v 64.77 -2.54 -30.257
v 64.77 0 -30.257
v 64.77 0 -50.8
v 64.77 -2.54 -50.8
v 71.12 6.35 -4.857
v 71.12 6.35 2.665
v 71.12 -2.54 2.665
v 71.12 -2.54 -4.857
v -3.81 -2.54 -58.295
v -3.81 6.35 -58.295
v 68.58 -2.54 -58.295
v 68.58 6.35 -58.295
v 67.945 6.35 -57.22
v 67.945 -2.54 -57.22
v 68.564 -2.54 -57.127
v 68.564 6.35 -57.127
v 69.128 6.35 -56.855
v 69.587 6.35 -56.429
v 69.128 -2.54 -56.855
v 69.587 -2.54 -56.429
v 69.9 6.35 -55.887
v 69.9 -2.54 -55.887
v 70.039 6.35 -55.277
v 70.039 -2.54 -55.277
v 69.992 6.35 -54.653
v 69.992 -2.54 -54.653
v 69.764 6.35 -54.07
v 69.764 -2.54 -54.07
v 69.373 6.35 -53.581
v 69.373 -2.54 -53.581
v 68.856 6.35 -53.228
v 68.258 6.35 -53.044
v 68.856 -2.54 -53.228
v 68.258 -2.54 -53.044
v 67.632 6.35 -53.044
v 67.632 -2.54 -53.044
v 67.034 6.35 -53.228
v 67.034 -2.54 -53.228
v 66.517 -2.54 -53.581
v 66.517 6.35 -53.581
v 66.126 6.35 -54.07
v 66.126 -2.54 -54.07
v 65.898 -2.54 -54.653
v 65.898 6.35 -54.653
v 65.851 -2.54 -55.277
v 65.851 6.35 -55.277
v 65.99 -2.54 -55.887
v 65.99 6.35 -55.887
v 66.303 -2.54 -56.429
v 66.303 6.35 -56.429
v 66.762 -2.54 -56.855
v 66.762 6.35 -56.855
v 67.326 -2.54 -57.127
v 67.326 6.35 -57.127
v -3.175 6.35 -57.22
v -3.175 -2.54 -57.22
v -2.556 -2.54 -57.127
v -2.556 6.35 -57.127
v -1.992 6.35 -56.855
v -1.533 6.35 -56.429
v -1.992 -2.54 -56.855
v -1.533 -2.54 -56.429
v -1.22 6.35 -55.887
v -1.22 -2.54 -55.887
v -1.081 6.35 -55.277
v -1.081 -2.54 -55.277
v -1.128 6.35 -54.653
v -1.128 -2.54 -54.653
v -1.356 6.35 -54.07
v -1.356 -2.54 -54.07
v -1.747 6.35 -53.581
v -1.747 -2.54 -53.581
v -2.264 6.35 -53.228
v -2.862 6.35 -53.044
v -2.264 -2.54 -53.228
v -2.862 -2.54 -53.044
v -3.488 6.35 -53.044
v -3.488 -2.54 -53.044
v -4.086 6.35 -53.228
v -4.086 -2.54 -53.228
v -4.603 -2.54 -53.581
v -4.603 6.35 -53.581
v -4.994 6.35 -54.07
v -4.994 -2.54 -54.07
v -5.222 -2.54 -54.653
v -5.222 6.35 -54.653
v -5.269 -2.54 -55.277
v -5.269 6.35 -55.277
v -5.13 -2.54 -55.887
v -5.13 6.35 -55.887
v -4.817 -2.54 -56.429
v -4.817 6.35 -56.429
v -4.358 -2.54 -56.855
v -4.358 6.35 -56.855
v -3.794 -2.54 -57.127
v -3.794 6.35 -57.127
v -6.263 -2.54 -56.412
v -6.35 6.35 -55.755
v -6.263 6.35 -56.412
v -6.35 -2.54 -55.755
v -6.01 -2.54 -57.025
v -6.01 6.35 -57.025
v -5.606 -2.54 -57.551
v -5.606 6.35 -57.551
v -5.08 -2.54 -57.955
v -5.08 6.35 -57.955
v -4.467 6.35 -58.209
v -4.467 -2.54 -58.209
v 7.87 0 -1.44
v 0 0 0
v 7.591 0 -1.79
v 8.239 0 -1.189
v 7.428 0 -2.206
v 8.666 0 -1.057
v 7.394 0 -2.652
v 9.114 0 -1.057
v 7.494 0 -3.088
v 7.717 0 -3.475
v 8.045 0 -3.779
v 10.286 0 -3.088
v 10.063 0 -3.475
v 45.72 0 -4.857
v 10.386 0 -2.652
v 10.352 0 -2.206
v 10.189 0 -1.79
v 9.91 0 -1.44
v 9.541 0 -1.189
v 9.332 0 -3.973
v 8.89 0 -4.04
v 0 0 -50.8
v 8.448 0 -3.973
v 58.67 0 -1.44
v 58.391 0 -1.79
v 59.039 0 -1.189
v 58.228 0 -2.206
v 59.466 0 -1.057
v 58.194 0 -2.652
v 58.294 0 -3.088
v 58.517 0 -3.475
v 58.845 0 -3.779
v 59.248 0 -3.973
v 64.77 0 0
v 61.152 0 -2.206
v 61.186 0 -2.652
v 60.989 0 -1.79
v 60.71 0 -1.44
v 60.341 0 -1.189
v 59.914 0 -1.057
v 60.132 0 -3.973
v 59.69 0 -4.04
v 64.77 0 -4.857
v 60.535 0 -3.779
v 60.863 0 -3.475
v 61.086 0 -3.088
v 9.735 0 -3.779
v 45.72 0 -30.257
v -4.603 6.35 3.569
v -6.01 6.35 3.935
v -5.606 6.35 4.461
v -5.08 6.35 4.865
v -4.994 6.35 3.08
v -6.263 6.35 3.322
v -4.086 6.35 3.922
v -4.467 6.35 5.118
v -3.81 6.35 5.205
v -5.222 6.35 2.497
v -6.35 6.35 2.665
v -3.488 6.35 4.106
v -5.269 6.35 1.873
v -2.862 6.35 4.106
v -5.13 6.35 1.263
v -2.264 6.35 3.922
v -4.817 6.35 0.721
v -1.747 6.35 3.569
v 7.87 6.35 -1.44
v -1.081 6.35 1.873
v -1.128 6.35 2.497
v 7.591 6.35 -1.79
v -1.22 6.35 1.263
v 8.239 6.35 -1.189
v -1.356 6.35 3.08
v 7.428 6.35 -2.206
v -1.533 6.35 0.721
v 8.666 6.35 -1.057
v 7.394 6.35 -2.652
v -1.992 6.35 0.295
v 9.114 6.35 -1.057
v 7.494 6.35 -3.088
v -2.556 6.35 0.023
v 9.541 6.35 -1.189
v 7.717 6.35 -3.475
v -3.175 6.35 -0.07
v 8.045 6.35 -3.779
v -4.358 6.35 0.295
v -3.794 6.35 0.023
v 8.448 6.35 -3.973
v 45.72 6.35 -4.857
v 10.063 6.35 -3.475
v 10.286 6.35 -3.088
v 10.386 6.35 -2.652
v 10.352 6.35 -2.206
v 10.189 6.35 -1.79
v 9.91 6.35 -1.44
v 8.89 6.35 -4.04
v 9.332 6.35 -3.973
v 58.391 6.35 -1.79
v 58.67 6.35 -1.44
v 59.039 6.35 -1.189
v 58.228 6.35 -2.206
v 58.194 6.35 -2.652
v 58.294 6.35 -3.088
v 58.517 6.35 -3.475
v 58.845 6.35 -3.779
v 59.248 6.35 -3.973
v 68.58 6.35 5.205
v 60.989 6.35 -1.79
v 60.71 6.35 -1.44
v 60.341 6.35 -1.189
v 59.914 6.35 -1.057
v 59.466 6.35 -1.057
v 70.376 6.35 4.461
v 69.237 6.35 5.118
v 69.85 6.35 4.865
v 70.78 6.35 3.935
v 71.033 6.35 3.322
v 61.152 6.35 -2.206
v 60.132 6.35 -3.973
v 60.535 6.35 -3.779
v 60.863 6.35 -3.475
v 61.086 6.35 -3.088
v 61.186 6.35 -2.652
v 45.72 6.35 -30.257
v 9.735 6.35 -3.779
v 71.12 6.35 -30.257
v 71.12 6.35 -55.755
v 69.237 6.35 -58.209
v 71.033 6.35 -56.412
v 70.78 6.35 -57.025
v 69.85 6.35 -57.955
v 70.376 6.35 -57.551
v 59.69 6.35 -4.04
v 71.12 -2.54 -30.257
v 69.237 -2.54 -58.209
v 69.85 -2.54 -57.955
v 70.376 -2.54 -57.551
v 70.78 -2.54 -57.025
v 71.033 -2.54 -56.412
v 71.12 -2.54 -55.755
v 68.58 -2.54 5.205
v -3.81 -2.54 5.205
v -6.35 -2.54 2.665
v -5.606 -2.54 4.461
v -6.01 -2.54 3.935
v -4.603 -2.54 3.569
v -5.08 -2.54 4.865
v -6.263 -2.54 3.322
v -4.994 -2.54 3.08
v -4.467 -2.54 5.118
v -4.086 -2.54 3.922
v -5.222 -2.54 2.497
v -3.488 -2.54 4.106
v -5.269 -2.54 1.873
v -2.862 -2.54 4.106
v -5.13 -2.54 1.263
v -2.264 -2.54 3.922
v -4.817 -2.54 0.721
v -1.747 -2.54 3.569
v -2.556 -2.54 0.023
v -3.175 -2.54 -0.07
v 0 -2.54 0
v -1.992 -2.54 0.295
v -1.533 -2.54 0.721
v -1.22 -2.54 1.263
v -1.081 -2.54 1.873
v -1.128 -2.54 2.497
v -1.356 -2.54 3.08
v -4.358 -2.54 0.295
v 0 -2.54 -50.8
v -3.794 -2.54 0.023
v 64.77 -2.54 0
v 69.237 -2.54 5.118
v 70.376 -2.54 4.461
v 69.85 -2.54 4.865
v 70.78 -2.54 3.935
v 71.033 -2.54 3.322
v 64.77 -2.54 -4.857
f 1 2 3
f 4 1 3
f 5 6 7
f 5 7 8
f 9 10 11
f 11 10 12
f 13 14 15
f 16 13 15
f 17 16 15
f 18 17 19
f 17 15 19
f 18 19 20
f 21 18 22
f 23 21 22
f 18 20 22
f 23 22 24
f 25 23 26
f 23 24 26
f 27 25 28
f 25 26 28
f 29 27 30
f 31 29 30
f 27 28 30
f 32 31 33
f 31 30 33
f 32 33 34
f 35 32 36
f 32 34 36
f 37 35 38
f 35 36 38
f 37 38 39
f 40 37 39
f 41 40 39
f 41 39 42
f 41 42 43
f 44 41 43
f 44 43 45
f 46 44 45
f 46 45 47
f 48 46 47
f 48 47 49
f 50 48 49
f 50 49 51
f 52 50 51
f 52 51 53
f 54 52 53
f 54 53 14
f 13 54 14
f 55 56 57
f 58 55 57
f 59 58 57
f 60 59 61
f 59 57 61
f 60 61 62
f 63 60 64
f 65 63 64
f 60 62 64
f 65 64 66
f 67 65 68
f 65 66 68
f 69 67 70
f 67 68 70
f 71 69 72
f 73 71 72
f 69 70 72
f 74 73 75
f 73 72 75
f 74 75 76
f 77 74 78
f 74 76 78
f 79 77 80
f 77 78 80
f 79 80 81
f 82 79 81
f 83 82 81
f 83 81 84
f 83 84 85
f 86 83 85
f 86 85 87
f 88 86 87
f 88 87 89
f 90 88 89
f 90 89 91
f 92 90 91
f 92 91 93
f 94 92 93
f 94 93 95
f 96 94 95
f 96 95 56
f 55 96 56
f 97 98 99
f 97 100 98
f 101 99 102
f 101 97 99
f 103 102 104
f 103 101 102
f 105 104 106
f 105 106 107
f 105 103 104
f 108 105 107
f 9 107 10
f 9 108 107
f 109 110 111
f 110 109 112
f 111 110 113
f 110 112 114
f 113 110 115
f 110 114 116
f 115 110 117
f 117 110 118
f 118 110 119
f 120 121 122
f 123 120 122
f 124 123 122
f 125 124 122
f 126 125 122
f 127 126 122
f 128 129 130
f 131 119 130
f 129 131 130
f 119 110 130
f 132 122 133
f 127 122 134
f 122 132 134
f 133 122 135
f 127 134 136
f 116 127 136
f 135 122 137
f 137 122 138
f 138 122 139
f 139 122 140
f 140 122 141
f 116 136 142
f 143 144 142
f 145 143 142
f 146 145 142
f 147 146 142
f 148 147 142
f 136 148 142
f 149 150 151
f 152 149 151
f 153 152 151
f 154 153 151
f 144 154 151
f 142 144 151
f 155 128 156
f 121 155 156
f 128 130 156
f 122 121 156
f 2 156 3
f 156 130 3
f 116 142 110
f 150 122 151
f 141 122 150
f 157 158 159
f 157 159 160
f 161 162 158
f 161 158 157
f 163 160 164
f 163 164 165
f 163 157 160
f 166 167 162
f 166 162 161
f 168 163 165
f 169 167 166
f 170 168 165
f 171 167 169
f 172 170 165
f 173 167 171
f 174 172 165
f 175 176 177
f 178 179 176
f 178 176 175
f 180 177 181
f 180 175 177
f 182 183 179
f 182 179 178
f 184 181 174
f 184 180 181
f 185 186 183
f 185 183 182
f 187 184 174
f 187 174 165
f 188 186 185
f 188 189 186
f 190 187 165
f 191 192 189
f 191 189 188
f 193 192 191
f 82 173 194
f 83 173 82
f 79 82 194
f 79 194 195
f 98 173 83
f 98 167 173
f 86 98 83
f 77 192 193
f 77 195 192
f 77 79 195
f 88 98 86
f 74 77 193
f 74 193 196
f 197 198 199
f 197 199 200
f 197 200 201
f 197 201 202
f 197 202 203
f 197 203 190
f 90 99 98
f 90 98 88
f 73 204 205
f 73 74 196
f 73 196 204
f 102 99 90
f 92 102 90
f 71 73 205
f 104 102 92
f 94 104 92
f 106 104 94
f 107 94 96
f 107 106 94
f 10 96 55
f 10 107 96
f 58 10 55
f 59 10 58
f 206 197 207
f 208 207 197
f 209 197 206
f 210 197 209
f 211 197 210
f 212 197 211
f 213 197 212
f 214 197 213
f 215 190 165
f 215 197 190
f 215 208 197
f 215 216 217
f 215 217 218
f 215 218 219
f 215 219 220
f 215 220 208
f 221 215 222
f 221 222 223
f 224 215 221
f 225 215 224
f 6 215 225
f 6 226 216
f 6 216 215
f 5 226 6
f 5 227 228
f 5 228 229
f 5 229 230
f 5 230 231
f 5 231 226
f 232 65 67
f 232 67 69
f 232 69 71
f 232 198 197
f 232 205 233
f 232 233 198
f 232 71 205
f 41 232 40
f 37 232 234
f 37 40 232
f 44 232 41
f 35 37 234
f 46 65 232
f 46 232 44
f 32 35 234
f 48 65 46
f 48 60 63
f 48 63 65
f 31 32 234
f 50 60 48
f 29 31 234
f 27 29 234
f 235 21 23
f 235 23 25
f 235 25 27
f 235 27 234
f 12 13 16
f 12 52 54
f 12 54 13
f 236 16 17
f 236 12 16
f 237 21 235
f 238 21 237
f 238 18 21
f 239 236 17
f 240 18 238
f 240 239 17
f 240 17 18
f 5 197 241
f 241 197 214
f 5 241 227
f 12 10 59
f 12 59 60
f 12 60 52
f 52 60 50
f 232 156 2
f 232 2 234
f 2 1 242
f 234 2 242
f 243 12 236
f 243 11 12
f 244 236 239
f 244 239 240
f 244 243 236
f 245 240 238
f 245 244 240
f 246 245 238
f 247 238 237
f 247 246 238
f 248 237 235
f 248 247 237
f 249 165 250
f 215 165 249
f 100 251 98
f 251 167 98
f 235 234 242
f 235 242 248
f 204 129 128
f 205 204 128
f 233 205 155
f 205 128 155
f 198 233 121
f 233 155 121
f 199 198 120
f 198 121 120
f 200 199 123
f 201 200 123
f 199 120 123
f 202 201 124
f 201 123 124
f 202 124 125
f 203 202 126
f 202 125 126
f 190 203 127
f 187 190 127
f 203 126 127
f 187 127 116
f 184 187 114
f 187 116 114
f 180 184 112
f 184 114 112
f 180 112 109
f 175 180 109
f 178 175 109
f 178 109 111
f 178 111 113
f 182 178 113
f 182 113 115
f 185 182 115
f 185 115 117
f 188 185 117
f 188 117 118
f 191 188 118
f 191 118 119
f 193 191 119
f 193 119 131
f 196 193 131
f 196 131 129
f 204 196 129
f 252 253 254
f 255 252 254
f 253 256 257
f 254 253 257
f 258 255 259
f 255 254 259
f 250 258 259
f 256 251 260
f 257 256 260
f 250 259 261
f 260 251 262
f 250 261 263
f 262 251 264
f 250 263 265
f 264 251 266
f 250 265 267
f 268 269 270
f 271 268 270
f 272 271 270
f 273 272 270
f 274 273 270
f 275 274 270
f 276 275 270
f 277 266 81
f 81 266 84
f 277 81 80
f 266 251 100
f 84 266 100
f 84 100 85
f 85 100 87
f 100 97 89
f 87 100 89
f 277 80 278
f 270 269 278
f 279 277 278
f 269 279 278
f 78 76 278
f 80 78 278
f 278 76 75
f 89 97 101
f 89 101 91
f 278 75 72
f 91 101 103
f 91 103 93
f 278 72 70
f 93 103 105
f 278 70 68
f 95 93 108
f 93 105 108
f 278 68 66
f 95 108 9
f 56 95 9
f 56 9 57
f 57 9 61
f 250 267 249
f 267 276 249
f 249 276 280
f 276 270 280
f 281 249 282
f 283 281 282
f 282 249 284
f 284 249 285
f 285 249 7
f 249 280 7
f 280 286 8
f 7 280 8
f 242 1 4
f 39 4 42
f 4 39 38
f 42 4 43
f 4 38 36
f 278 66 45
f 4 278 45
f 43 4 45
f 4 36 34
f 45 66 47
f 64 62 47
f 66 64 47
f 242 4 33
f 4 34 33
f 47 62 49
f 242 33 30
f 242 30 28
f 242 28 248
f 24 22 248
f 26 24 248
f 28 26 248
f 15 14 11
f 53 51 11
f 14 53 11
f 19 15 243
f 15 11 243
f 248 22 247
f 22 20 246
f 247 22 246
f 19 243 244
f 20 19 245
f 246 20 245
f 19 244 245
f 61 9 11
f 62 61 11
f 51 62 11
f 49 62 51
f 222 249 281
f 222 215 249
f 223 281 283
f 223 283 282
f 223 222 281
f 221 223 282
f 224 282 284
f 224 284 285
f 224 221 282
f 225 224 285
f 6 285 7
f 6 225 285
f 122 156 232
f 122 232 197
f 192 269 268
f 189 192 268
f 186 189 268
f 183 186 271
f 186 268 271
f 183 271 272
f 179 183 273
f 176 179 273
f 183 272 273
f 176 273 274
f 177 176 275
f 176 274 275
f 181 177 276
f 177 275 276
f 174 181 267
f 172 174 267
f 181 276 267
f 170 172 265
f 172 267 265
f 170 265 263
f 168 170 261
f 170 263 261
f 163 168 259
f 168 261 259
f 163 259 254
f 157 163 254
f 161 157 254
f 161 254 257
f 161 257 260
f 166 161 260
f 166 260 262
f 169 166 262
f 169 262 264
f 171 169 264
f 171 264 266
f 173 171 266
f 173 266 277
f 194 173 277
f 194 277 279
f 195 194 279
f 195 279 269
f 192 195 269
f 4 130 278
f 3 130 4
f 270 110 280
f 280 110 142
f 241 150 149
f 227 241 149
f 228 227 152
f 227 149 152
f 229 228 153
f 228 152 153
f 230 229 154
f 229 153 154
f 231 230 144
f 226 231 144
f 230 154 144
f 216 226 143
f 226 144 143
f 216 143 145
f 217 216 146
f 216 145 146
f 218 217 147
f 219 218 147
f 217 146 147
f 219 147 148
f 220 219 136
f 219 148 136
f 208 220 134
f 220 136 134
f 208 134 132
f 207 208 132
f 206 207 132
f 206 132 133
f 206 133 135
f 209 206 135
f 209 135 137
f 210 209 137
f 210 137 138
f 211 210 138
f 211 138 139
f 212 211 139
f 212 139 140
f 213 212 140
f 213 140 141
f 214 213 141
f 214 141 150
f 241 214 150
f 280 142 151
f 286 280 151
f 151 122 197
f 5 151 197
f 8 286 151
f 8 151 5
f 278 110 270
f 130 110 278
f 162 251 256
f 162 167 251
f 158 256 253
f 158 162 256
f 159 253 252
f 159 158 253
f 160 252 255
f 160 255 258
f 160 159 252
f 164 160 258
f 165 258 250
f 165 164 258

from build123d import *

# Parameters (mm, degrees)
SKETCH1_W           = 77.47
SKETCH1_H           = 63.5
BOSS_EXTRUDE1_DEPTH = 6.35
SKETCH1_3_W         = 77.47
SKETCH1_3_H         = 63.5
SKETCH1_3_W_2       = 64.77
SKETCH1_3_H_2       = 50.8
BOSS_EXTRUDE2_DEPTH = 2.54
SKETCH2_W           = 25.4
SKETCH2_H           = 25.4
CUT_EXTRUDE1_DEPTH  = 12.7
SKETCH3_R           = 2.1
CUT_EXTRUDE2_DEPTH  = 12.7
FILLET1_R           = 2.54
SKETCH4_R           = 1.5
CUT_EXTRUDE3_DEPTH  = 22.86


with BuildPart() as part:
    # Sketch1 → Boss-Extrude1 (new body)
    with BuildSketch(Plane(origin=(0, 0, 0), x_dir=(1, 0, 0), z_dir=(0, 1, 0))):
        with Locations((32.385, 26.545081967)):
            Rectangle(SKETCH1_W, SKETCH1_H)
    extrude(amount=BOSS_EXTRUDE1_DEPTH)

    # Sketch1<3> → Boss-Extrude2 (add)
    with BuildSketch(Plane(origin=(0, 0, 0), x_dir=(1, 0, 0), z_dir=(0, 1, 0))):
        with Locations((32.385, 26.545081967)):
            Rectangle(SKETCH1_3_W, SKETCH1_3_H)
        with Locations((32.385, 25.4)):
            Rectangle(SKETCH1_3_W_2, SKETCH1_3_H_2, mode=Mode.SUBTRACT)
    extrude(amount=-BOSS_EXTRUDE2_DEPTH)

    # Sketch2 → Cut-Extrude1 (cut)
    with BuildSketch(Plane.XZ.offset(2.54)):
        with Locations((58.42, -17.556565957)):
            Rectangle(SKETCH2_W, SKETCH2_H)
    extrude(amount=-CUT_EXTRUDE1_DEPTH, mode=Mode.SUBTRACT)

    # Sketch3 → Cut-Extrude2 (cut)
    with BuildSketch(Plane.XZ.offset(2.54)):
        with Locations((-3.175, 2.029918033)):
            Circle(SKETCH3_R)
        with Locations((-3.175, -55.120081967)):
            Circle(SKETCH3_R)
        with Locations((67.945, -55.120081967)):
            Circle(SKETCH3_R)
    extrude(amount=-CUT_EXTRUDE2_DEPTH, mode=Mode.SUBTRACT)

    # Fillet1
    fillet1_edges = [part.edges().sort_by_distance(p)[0] for p in [
        (-6.35, 1.905, -58.295081967),
        (71.12, 1.905, -58.295081967),
        (71.12, 1.905, 5.204918033),
        (-6.35, 1.905, 5.204918033),
    ]]
    fillet(fillet1_edges, radius=FILLET1_R)

    # Sketch4 → Cut-Extrude3 (cut)
    with BuildSketch(Plane.XZ):
        with Locations((59.69, -2.54)):
            Circle(SKETCH4_R)
        with Locations((8.89, -2.54)):
            Circle(SKETCH4_R)
    extrude(amount=-CUT_EXTRUDE3_DEPTH, mode=Mode.SUBTRACT)


solid = part.part
